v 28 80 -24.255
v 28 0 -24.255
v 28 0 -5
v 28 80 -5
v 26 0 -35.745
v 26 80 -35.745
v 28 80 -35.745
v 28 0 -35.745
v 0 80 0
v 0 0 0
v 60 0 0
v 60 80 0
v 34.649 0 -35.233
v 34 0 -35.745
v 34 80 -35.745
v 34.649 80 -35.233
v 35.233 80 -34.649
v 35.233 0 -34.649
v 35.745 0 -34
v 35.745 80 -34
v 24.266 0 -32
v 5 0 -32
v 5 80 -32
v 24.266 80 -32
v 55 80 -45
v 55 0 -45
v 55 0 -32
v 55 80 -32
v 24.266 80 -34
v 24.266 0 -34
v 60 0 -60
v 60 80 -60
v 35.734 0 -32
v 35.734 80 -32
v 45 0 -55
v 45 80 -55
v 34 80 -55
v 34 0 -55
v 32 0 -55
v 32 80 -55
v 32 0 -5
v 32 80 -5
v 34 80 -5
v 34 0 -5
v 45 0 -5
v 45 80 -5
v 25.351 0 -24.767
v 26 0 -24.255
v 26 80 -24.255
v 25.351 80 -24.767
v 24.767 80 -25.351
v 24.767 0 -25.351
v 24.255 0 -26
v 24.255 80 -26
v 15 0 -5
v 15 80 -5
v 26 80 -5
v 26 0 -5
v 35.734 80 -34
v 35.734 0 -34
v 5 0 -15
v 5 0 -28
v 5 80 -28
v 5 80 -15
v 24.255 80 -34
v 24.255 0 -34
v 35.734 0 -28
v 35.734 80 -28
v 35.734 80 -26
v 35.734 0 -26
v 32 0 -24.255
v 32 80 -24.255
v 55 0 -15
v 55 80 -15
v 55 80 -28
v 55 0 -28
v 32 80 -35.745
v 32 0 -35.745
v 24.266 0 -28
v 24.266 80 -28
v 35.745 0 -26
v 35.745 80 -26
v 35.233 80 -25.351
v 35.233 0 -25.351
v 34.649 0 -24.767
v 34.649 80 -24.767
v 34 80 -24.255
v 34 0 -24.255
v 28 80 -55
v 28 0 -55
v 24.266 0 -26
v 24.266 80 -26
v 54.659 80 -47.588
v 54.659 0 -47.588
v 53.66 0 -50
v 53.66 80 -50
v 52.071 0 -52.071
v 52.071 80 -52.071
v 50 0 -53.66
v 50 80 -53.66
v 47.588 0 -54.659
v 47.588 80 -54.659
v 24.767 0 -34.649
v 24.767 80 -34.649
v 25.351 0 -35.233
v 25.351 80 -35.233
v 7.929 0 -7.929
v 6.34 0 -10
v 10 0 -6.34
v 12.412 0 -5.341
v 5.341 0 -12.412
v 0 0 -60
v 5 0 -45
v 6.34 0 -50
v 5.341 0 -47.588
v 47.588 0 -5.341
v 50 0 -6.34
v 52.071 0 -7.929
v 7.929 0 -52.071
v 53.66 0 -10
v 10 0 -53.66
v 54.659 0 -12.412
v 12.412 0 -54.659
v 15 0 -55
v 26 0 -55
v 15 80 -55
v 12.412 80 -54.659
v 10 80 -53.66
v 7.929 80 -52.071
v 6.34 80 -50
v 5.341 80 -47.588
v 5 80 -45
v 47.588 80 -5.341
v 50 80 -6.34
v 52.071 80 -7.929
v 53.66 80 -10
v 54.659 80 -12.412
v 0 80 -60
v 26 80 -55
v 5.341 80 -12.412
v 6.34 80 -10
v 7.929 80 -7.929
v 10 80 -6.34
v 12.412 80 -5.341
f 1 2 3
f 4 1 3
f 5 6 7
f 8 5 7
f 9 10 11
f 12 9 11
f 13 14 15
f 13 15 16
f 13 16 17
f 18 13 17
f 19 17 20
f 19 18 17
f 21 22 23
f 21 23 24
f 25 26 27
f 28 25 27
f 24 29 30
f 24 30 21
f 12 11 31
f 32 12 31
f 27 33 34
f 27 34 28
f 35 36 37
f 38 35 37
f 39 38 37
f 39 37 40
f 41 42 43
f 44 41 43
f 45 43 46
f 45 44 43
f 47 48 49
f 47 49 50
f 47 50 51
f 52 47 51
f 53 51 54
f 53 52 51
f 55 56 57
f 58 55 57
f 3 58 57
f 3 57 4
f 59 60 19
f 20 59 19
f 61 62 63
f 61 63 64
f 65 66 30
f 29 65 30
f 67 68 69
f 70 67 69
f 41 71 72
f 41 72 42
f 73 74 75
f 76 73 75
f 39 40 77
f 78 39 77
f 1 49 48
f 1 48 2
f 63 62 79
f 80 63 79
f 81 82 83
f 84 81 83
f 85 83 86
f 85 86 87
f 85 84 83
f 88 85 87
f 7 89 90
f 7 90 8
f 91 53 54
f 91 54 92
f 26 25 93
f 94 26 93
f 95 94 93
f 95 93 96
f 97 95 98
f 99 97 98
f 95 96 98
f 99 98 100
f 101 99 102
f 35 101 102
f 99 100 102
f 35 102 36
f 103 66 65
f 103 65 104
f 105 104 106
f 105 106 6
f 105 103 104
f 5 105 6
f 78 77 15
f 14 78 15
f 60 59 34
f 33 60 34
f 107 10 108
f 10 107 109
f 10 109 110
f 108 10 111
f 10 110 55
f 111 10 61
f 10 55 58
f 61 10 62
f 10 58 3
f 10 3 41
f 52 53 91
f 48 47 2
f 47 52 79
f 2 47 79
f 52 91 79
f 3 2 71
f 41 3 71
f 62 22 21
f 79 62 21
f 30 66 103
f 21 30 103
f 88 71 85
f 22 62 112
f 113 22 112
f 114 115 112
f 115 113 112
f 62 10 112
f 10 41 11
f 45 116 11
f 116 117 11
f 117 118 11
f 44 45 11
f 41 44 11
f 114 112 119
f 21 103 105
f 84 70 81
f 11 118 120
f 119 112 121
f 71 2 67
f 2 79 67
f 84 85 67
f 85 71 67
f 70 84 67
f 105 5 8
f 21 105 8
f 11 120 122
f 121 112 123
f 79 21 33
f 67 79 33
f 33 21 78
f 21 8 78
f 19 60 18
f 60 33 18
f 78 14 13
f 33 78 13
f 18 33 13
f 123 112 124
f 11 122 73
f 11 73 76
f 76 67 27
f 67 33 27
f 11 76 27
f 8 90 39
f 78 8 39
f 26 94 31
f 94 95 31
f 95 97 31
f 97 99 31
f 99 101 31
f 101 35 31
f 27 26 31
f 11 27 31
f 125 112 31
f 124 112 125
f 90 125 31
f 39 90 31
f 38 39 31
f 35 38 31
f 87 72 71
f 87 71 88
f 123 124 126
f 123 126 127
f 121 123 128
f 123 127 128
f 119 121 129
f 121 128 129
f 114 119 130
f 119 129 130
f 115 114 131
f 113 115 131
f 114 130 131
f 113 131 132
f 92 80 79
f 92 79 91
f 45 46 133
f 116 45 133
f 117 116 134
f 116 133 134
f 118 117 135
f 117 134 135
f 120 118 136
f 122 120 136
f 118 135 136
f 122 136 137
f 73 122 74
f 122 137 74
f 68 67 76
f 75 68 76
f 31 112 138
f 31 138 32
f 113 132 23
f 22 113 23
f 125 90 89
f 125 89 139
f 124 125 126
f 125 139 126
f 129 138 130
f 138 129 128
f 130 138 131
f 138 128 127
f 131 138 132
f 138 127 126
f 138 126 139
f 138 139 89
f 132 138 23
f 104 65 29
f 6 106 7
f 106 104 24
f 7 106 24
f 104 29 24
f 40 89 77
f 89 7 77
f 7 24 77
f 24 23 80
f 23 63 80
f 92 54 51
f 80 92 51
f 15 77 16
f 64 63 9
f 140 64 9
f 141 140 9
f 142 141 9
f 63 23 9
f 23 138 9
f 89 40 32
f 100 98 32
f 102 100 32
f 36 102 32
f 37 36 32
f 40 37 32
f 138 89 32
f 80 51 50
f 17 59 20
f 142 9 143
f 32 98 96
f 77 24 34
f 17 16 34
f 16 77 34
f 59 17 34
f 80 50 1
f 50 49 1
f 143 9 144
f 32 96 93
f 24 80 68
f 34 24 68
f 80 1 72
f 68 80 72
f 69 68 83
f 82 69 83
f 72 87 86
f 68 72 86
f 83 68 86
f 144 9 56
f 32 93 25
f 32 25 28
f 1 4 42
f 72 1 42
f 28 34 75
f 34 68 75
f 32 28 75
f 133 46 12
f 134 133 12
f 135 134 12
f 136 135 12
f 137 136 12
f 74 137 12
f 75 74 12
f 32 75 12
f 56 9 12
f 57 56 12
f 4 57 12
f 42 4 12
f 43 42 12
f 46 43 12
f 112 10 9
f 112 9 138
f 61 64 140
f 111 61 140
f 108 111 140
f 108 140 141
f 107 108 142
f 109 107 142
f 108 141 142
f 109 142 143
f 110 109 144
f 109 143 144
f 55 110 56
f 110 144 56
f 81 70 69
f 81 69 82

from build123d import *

# Parameters (mm, degrees)
SKETCH2_W           = 60
SKETCH2_H           = 60
BOSS_EXTRUDE2_DEPTH = 80
CUT_EXTRUDE1_DEPTH  = 80
SKETCH4_R           = 7
BOSS_EXTRUDE3_DEPTH = 80
SKETCH5_W           = 2
SKETCH5_H           = 19.255437353
SKETCH5_W_2         = 19.265898102
SKETCH5_H_2         = 2
CUT_EXTRUDE2_DEPTH  = 80


with BuildPart() as part:
    # Sketch2 → Boss-Extrude2 (new body)
    with BuildSketch(Plane(origin=(0, 0, 0), x_dir=(1, 0, 0), z_dir=(0, 1, 0))):
        with Locations((30, 30)):
            Rectangle(SKETCH2_W, SKETCH2_H)
    extrude(amount=BOSS_EXTRUDE2_DEPTH)

    # Sketch3 → Cut-Extrude1 (cut)
    with BuildSketch(Plane(origin=(0, 80, 0), x_dir=(1, 0, 0), z_dir=(0, 1, 0))):
        with BuildLine():
            Line((26, 55), (15, 55))
            ThreePointArc((15, 55), (7.928932188, 52.071067812), (5, 45))
            Line((5, 45), (5, 34))
            Line((5, 34), (26, 34))
            Line((26, 34), (26, 55))
        make_face()
        with BuildLine():
            Line((45, 55), (34, 55))
            Line((34, 55), (34, 34))
            Line((34, 34), (55, 34))
            Line((55, 34), (55, 45))
            ThreePointArc((55, 45), (52.071067812, 52.071067812), (45, 55))
        make_face()
        with BuildLine():
            Line((26, 26), (5, 26))
            Line((5, 26), (5, 15))
            ThreePointArc((5, 15), (7.928932188, 7.928932188), (15, 5))
            Line((15, 5), (26, 5))
            Line((26, 5), (26, 26))
        make_face()
        with BuildLine():
            Line((55, 15), (55, 26))
            Line((55, 26), (34, 26))
            Line((34, 26), (34, 5))
            Line((34, 5), (45, 5))
            ThreePointArc((45, 5), (52.071067812, 7.928932188), (55, 15))
        make_face()
    extrude(amount=-CUT_EXTRUDE1_DEPTH, mode=Mode.SUBTRACT)

    # Sketch4 → Boss-Extrude3 (add)
    with BuildSketch(Plane.XZ):
        with Locations((30, -30)):
            Circle(SKETCH4_R)
    extrude(amount=-BOSS_EXTRUDE3_DEPTH)

    # Sketch5 → Cut-Extrude2 (cut)
    with BuildSketch(Plane.XZ):
        with Locations((27, -14.627718677)):
            Rectangle(SKETCH5_W, SKETCH5_H)
        with Locations((33, -14.627718677)):
            Rectangle(SKETCH5_W, SKETCH5_H)
        with Locations((45.367050949, -27)):
            Rectangle(SKETCH5_W_2, SKETCH5_H_2)
        with Locations((45.367050949, -33)):
            Rectangle(SKETCH5_W_2, SKETCH5_H_2)
        with Locations((33, -45.372281324)):
            Rectangle(SKETCH5_W, SKETCH5_H)
        with Locations((27, -45.372281324)):
            Rectangle(SKETCH5_W, SKETCH5_H)
        with Locations((14.632949051, -33)):
            Rectangle(SKETCH5_W_2, SKETCH5_H_2)
        with Locations((14.632949051, -27)):
            Rectangle(SKETCH5_W_2, SKETCH5_H_2)
    extrude(amount=-CUT_EXTRUDE2_DEPTH, mode=Mode.SUBTRACT)


solid = part.part
